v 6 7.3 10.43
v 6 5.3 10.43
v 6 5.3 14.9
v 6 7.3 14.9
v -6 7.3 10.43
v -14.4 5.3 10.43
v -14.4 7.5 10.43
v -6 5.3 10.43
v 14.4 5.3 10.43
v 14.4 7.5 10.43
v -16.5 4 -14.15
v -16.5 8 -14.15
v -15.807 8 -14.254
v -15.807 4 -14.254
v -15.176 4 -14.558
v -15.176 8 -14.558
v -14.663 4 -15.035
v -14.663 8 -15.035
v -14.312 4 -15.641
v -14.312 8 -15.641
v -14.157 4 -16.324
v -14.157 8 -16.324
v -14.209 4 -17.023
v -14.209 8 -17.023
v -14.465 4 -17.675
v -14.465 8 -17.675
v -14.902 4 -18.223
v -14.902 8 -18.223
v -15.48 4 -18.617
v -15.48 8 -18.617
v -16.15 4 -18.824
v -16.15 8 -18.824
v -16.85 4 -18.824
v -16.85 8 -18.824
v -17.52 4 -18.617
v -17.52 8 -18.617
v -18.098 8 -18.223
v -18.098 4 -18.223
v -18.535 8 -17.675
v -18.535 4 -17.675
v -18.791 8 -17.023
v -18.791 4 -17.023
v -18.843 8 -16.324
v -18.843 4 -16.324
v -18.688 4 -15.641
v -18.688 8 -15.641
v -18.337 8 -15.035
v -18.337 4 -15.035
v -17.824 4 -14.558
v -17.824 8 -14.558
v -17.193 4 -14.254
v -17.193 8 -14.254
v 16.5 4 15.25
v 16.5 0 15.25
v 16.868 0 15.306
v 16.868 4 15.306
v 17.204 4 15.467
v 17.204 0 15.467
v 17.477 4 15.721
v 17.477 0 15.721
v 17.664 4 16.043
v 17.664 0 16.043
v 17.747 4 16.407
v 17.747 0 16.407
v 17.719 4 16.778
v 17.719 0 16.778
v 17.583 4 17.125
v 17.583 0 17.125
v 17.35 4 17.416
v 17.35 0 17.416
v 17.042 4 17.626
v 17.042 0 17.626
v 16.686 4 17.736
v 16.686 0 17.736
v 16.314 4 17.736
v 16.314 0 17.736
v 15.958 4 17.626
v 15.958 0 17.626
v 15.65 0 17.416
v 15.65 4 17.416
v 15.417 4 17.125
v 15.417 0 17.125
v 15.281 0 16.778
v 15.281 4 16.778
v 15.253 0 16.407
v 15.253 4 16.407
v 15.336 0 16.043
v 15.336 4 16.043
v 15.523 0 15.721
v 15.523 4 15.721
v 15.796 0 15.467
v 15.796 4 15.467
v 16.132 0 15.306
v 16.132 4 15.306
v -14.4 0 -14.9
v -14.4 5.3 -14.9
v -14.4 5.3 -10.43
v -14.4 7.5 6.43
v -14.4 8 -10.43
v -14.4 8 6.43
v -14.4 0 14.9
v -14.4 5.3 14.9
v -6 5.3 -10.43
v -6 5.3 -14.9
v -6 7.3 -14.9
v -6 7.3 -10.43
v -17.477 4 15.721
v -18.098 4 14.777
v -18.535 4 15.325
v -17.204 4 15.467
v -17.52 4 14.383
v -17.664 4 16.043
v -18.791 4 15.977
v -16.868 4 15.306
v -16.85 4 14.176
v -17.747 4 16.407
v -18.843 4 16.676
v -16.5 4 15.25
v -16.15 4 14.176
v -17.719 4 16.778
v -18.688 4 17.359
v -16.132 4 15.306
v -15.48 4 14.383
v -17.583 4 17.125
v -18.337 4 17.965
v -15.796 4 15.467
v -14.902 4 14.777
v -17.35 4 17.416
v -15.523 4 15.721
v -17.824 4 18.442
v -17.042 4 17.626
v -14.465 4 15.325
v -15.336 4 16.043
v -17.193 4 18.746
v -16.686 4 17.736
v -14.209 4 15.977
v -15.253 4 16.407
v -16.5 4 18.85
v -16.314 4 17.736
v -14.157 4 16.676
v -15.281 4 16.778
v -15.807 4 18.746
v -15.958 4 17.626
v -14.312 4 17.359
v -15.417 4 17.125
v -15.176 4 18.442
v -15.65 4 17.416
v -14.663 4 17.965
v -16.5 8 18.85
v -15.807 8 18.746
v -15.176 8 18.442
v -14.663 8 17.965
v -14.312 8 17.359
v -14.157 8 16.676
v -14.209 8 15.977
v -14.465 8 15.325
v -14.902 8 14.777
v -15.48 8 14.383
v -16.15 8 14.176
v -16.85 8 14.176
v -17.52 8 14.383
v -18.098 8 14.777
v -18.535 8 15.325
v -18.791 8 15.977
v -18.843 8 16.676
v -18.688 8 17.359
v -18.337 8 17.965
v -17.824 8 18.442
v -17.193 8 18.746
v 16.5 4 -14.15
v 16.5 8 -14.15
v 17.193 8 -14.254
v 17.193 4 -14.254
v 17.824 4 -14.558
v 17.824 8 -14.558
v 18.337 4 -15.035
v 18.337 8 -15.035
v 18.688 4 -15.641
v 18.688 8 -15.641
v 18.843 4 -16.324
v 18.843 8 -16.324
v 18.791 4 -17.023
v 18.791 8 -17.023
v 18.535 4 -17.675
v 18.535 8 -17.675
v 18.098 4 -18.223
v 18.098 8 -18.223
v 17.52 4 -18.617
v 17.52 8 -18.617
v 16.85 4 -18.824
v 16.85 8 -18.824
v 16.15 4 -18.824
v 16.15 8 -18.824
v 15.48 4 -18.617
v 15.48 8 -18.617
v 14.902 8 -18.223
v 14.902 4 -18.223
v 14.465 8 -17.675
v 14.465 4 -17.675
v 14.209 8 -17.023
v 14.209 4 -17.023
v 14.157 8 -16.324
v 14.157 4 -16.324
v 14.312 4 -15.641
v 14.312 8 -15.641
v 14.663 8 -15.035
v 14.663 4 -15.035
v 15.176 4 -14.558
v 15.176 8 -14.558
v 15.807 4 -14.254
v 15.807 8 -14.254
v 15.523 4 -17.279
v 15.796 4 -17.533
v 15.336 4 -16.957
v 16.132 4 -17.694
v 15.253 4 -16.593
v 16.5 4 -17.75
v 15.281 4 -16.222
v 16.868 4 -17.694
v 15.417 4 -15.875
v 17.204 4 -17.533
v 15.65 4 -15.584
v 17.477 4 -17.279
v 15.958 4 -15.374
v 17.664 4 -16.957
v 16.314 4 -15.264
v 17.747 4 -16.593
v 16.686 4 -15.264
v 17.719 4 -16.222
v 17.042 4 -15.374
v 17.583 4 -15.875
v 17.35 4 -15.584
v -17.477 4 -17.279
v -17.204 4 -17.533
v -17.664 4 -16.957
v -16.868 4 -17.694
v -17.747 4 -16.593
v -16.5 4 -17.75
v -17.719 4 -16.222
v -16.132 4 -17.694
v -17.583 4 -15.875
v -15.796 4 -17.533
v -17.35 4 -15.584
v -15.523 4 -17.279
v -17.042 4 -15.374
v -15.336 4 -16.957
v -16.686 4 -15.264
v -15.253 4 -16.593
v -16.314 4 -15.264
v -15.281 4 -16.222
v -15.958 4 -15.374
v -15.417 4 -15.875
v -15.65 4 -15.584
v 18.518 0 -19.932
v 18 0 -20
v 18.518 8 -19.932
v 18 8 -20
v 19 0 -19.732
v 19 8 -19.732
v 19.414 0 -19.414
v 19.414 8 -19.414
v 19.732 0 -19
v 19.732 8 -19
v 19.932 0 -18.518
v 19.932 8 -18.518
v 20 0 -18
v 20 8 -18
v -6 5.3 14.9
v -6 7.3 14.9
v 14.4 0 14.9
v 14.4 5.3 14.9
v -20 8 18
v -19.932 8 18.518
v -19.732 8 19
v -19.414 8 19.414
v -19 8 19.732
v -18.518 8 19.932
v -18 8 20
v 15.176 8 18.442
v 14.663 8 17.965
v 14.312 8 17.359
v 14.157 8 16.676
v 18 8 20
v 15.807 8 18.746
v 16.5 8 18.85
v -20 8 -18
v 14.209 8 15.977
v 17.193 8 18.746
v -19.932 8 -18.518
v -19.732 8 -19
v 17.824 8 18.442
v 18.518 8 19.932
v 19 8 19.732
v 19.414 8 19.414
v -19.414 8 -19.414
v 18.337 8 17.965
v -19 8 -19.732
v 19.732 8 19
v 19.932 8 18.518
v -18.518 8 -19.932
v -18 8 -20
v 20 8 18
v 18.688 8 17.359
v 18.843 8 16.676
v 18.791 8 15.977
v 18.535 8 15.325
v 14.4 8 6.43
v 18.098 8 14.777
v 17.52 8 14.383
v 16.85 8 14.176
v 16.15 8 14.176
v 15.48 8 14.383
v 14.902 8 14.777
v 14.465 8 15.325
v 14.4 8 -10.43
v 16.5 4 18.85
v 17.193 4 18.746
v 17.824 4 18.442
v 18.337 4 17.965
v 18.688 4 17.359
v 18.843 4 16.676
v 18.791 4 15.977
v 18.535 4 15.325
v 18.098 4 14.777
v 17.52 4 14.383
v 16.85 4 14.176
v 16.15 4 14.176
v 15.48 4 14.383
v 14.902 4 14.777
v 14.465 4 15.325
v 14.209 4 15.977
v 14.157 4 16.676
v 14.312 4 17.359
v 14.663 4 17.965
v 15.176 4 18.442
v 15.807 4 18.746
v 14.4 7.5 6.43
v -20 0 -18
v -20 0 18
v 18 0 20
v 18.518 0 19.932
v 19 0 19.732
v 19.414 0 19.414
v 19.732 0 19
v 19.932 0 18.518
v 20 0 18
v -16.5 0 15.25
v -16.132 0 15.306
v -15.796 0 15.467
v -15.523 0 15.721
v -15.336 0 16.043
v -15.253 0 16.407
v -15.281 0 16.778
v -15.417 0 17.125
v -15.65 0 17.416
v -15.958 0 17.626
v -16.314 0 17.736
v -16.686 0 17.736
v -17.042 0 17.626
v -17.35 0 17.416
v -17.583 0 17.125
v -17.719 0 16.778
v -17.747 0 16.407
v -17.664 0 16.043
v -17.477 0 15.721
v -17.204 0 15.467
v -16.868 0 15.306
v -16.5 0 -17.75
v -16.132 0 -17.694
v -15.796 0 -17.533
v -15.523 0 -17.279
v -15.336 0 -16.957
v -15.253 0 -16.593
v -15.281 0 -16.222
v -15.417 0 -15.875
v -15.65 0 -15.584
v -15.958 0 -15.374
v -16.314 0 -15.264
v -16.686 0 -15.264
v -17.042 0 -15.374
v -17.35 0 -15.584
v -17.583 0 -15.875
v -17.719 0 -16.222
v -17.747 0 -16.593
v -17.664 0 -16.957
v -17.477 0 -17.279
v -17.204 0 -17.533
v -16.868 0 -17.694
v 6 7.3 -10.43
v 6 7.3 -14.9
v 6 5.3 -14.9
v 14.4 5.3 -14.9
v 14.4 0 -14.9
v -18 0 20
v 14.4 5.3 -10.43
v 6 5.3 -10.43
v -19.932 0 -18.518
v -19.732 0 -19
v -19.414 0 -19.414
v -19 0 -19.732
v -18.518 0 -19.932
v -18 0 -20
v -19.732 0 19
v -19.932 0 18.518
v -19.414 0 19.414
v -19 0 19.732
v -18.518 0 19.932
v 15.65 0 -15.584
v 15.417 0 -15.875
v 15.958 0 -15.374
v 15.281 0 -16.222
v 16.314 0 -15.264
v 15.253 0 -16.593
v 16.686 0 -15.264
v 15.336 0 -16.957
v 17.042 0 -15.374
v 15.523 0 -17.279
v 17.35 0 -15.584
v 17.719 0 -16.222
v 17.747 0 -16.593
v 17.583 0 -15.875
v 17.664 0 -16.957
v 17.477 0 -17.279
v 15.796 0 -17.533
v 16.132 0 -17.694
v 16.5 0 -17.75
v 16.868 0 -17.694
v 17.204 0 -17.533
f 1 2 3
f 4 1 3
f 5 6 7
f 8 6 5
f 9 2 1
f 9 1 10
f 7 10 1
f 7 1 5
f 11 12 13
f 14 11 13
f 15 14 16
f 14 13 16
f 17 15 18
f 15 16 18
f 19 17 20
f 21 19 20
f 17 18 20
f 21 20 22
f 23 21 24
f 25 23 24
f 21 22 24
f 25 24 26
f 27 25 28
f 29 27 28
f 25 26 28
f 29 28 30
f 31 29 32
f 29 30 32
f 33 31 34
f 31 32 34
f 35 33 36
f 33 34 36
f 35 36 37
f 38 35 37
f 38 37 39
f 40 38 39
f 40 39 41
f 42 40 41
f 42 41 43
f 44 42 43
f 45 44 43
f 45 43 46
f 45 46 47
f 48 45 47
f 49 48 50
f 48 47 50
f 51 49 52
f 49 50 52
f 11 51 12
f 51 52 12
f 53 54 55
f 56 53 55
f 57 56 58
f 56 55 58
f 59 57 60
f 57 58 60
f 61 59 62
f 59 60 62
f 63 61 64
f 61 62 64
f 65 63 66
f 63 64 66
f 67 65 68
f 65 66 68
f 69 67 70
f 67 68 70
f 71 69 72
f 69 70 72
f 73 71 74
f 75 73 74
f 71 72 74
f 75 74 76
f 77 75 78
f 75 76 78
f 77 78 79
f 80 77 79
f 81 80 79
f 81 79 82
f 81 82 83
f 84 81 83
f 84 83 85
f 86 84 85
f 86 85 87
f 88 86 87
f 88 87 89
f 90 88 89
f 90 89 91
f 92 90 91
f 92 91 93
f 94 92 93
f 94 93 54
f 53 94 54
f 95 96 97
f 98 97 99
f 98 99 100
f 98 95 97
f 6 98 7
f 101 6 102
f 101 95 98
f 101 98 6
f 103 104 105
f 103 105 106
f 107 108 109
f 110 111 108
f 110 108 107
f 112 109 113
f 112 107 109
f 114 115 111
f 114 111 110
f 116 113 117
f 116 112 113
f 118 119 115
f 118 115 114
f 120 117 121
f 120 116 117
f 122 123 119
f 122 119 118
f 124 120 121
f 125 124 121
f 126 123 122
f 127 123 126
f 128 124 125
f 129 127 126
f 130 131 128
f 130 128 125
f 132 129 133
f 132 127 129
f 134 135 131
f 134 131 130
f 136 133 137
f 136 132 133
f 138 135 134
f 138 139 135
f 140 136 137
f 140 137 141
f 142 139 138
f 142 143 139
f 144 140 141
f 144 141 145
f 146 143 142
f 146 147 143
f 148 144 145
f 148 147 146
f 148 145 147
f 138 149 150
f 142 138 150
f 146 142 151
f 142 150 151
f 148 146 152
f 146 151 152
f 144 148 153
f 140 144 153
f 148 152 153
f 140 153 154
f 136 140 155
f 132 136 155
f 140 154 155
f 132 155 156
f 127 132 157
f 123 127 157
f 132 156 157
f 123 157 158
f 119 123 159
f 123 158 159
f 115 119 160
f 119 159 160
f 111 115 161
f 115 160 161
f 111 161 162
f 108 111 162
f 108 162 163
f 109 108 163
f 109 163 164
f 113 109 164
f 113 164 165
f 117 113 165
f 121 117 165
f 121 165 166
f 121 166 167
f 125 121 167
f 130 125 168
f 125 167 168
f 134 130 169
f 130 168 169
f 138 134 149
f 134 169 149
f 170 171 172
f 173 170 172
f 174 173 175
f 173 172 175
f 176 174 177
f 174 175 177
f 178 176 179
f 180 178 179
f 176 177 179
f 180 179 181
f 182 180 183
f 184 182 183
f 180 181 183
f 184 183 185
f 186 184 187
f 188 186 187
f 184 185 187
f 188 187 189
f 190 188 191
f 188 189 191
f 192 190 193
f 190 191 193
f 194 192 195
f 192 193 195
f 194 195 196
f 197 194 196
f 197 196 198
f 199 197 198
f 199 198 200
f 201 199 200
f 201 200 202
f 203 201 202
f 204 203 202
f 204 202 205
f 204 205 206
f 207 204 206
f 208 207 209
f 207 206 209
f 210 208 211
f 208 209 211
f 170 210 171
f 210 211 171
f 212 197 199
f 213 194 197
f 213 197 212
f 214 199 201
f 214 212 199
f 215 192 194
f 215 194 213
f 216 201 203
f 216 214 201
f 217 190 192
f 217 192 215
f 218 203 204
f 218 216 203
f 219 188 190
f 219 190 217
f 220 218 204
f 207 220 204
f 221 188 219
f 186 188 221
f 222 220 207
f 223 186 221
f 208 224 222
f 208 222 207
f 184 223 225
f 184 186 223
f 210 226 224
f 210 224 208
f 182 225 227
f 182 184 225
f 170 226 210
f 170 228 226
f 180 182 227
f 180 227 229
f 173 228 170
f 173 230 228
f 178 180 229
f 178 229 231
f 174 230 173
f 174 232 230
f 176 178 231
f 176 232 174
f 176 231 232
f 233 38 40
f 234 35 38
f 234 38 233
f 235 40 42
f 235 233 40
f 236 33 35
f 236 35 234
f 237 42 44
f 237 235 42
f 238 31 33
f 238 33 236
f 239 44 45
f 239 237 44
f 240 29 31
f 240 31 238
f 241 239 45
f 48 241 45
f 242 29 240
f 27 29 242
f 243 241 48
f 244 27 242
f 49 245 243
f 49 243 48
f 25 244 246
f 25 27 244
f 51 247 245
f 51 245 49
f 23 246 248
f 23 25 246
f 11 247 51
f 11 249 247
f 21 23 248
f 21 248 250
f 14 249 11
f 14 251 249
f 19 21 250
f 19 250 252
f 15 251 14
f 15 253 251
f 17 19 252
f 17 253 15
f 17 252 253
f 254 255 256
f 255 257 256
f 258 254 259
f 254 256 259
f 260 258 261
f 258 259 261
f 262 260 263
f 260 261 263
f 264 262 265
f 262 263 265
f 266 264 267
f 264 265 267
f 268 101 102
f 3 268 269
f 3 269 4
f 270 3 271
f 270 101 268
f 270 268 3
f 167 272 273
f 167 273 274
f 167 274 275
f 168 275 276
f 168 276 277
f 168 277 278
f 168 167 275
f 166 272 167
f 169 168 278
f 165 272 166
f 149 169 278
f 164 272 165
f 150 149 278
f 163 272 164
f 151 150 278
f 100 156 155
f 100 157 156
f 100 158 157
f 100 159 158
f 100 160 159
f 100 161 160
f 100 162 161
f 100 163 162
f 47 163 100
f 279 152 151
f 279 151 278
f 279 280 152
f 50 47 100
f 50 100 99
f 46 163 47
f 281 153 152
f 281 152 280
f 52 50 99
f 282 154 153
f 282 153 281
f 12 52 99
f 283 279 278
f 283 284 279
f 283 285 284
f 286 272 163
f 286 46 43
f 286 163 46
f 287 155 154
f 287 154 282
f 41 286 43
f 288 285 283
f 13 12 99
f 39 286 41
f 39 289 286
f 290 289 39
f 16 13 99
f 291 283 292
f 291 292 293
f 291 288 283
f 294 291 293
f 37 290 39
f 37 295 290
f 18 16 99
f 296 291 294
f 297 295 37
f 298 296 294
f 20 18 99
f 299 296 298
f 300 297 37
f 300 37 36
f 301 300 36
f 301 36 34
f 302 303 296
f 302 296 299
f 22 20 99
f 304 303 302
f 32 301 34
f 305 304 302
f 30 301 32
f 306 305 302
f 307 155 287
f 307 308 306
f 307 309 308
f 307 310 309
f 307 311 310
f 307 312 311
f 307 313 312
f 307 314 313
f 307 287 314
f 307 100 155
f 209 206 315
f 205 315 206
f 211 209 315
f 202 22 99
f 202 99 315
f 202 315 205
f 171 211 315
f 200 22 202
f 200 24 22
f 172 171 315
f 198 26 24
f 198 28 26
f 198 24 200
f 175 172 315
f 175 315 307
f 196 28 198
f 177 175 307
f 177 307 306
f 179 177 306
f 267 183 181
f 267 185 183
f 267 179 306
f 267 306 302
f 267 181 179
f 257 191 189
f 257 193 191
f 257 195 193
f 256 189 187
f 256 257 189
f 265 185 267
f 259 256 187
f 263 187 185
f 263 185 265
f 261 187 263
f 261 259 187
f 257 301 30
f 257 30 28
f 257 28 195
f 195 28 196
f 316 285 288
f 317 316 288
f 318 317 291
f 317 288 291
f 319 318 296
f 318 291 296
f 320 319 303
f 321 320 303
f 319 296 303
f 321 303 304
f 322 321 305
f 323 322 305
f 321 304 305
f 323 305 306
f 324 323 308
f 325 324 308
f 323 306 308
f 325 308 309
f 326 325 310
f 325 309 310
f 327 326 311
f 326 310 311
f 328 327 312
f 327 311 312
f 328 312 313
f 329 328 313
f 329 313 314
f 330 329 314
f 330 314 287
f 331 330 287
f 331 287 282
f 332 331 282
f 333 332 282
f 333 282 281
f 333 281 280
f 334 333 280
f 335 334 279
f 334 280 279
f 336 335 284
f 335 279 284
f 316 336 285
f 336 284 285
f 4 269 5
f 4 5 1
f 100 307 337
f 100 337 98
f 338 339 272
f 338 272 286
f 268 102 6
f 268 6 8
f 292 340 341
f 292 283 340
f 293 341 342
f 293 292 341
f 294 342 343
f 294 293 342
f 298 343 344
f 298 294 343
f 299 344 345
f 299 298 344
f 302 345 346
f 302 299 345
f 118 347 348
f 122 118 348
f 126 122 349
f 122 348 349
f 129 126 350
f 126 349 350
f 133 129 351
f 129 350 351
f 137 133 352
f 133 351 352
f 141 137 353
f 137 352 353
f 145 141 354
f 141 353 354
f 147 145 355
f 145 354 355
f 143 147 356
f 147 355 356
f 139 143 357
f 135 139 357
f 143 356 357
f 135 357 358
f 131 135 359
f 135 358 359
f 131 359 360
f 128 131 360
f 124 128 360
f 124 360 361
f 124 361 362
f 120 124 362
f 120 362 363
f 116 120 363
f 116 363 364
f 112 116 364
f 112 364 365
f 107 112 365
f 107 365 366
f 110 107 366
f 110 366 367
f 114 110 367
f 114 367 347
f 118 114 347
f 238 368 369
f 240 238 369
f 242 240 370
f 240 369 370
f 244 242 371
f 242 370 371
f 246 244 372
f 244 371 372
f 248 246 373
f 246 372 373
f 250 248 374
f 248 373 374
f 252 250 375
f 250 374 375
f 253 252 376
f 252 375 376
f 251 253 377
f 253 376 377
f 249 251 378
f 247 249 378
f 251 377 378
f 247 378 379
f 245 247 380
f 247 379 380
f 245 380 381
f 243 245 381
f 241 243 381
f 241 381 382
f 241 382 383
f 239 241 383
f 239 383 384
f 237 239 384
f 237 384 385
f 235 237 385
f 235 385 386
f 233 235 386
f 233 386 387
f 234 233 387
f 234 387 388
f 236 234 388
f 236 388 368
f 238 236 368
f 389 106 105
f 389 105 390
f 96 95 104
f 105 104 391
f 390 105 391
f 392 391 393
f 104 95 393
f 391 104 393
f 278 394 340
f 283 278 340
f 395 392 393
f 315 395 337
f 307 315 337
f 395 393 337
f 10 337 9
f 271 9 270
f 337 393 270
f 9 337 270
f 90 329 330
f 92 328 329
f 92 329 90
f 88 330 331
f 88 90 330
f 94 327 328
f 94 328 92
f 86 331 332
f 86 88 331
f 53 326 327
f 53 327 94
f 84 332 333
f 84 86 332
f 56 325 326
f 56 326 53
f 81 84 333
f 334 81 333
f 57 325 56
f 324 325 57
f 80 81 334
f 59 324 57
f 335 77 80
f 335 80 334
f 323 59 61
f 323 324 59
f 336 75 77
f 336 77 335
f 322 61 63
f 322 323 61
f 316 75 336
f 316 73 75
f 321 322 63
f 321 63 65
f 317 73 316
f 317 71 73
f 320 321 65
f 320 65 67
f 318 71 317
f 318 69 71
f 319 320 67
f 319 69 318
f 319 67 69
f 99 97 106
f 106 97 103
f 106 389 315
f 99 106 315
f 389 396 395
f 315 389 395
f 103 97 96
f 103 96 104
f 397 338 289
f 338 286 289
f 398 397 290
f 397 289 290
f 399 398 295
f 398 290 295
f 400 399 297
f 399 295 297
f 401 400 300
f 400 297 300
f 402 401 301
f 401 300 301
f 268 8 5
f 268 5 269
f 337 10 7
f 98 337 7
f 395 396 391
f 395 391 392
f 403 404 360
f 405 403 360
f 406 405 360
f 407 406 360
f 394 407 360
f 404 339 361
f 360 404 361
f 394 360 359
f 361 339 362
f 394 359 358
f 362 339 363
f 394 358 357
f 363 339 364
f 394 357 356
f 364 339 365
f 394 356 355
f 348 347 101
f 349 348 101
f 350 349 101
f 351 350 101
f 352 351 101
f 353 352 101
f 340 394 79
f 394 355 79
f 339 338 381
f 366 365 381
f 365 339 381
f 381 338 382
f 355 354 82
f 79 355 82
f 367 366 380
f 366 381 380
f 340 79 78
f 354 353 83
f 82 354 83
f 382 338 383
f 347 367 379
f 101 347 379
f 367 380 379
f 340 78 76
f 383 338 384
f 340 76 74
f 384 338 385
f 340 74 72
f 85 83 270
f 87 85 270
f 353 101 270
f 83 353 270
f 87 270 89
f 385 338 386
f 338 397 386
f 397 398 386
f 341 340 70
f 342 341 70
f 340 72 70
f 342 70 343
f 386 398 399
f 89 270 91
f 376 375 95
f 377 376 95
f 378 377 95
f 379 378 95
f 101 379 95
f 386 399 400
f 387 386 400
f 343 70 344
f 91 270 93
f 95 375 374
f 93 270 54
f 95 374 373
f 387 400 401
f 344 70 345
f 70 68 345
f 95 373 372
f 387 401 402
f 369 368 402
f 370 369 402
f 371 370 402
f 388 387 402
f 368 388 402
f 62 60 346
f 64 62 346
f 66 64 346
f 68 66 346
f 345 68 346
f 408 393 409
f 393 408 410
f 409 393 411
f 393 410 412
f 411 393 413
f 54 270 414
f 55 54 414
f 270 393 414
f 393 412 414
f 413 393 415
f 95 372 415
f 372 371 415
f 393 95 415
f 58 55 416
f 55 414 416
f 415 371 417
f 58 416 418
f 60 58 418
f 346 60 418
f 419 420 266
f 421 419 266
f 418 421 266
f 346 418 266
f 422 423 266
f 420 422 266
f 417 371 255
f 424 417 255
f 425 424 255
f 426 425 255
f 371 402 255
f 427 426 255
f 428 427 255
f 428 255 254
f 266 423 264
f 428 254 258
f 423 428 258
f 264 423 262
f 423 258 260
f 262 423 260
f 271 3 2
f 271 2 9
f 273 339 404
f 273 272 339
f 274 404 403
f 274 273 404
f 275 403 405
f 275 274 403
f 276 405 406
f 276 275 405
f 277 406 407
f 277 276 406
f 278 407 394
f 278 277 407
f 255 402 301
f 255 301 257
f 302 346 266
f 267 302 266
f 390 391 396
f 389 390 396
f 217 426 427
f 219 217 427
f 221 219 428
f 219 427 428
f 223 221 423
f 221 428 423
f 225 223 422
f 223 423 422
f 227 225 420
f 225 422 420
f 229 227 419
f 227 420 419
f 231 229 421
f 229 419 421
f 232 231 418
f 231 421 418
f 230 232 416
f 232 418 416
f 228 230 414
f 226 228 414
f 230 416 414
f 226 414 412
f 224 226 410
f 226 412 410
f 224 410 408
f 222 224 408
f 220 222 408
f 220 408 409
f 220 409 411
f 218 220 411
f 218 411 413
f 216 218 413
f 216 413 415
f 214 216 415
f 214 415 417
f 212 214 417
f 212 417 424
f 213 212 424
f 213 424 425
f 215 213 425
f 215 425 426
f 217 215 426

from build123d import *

# Parameters (mm, degrees)
SKETCH_1_W             = 40
SKETCH_1_H             = 40
EXTRUDE_644_DEPTH      = 8
SKETCH_2_W             = 28.8
SKETCH_2_H             = 29.8
CUT_EXTRUDE_826_DEPTH  = 5.3
SKETCH_3_W             = 28.8
SKETCH_3_H             = 20.86
CUT_EXTRUDE_1017_DEPTH = 29.776552955
SKETCH_4_W             = 12
SKETCH_4_H             = 4.47
CUT_EXTRUDE_1234_DEPTH = 2
SKETCH_5_W             = 28.8
SKETCH_5_H             = 0.5
EXTRUDE_1465_DEPTH     = 4
SKETCH_7_R             = 1.25
CUT_EXTRUDE_1704_DEPTH = 30.393876913
FILLET_1_R             = 2
SKETCH_8_R             = 2.35
CUT_EXTRUDE_2246_DEPTH = 4


with BuildPart() as part:
    # Эскиз1 → Extrude 644 (new body)
    with BuildSketch(Plane(origin=(0, 0, 0), x_dir=(1, 0, 0), z_dir=(0, 1, 0))):
        Rectangle(SKETCH_1_W, SKETCH_1_H)
    extrude(amount=EXTRUDE_644_DEPTH)

    # Эскиз2 → Cut-Extrude 826 (cut)
    with BuildSketch(Plane.XZ):
        Rectangle(SKETCH_2_W, SKETCH_2_H)
    extrude(amount=-CUT_EXTRUDE_826_DEPTH, mode=Mode.SUBTRACT)

    # Эскиз3 → Cut-Extrude 1017 (cut, through all)
    with BuildSketch(Plane.XZ.offset(-5.3)):
        Rectangle(SKETCH_3_W, SKETCH_3_H)
    extrude(amount=-CUT_EXTRUDE_1017_DEPTH, mode=Mode.SUBTRACT)

    # Эскиз4 → Cut-Extrude 1234 (cut)
    with BuildSketch(Plane.XZ.offset(-5.3)):
        with Locations((0, 12.665)):
            Rectangle(SKETCH_4_W, SKETCH_4_H)
        with Locations((0, -12.665)):
            Rectangle(SKETCH_4_W, SKETCH_4_H)
    extrude(amount=-CUT_EXTRUDE_1234_DEPTH, mode=Mode.SUBTRACT)

    # Эскиз5 → Extrude 1465 (add)
    with BuildSketch(Plane(origin=(0, 0, 10.43), x_dir=(-1, 0, 0), z_dir=(0, 0, -1))):
        with Locations((0, 7.75)):
            Rectangle(SKETCH_5_W, SKETCH_5_H)
    extrude(amount=EXTRUDE_1465_DEPTH)

    # Эскиз7 → Cut-Extrude 1704 (cut, through all)
    with BuildSketch(Plane.XZ):
        with Locations(Location((-16.5, 16.5, 0), (0, 0, 270))):
            Circle(SKETCH_7_R)
        with Locations(Location((16.5, 16.5, 0), (0, 0, 270))):
            Circle(SKETCH_7_R)
        with Locations(Location((16.5, -16.5, 0), (0, 0, 270))):
            Circle(SKETCH_7_R)
        with Locations(Location((-16.5, -16.5, 0), (0, 0, 270))):
            Circle(SKETCH_7_R)
    extrude(amount=-CUT_EXTRUDE_1704_DEPTH, mode=Mode.SUBTRACT)

    # Скругление1
    fillet_1_edges = [part.edges().sort_by_distance(p)[0] for p in [
        (20, 4, 20),
        (-20, 4, 20),
        (-20, 4, -20),
        (20, 4, -20),
    ]]
    fillet(fillet_1_edges, radius=FILLET_1_R)

    # Эскиз8 → Cut-Extrude 2246 (cut)
    with BuildSketch(Plane(origin=(0, 8, 0), x_dir=(1, 0, 0), z_dir=(0, 1, 0))):
        with Locations(Location((-16.5, 16.5, 0), (0, 0, 270))):
            Circle(SKETCH_8_R)
        with Locations(Location((-16.5, -16.5, 0), (0, 0, 270))):
            Circle(SKETCH_8_R)
        with Locations(Location((16.5, -16.5, 0), (0, 0, 270))):
            Circle(SKETCH_8_R)
        with Locations(Location((16.5, 16.5, 0), (0, 0, 270))):
            Circle(SKETCH_8_R)
    extrude(amount=-CUT_EXTRUDE_2246_DEPTH, mode=Mode.SUBTRACT)


solid = part.part
